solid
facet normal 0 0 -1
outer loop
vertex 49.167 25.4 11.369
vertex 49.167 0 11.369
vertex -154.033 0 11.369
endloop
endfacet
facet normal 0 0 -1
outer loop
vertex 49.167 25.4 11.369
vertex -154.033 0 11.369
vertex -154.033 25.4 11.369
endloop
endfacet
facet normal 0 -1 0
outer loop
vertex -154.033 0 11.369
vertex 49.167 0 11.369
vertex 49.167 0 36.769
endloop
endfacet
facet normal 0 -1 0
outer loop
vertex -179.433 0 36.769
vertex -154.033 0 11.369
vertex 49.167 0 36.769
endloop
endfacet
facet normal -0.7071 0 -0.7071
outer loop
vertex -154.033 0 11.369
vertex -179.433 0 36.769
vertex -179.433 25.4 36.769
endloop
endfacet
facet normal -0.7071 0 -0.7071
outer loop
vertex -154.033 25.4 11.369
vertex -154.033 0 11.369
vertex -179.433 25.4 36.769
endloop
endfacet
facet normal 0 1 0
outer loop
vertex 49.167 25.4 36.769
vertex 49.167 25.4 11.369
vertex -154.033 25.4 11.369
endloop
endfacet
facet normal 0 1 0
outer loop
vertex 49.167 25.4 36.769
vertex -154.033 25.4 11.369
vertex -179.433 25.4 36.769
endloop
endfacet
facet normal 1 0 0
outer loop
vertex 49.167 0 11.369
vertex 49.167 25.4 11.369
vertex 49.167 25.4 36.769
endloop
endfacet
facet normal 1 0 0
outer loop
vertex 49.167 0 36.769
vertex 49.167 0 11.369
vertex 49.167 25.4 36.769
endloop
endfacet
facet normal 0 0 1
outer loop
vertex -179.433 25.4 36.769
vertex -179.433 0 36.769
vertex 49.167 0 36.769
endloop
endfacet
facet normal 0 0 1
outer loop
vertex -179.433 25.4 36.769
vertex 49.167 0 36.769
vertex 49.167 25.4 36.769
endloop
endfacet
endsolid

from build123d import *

# Parameters (mm, degrees)
F0_W     = 215.9
F0_H     = 25.4
F1_DEPTH = 25.4
F2_DEPTH = 12.7
F3_SIZE2 = 25.39999
F3_SIZE  = 25.39999


# Not quite as in the source:
# - a fillet or chamfer is up to 0.001 mm smaller than in the source, because OpenCascade refuses the exact size


with BuildPart() as f1:
    # F0 (on Front) → F1 (new body)
    with BuildSketch(Plane.XZ):
        with Locations((-71.4832603614, 24.0690046921)):
            Rectangle(F0_W, F0_H)
    extrude(amount=-F1_DEPTH)

    # F2 (add): a face of the model
    f2_faces = [f1.faces().sort_by_distance(p)[0] for p in [
        (36.4667396386, 12.7, 24.0690046921),
    ]]
    extrude(f2_faces, amount=F2_DEPTH)

    # F3 (size 25.4 and 25.4 in the source; OpenCascade refuses exactly that, so slightly less here)
    f3_edges = [f1.edges().sort_by_distance(p)[0] for p in [
        (-179.43326, 12.7, 11.369005),
    ]]
    chamfer(f3_edges, length=F3_SIZE, length2=F3_SIZE2)


solid = f1.part
